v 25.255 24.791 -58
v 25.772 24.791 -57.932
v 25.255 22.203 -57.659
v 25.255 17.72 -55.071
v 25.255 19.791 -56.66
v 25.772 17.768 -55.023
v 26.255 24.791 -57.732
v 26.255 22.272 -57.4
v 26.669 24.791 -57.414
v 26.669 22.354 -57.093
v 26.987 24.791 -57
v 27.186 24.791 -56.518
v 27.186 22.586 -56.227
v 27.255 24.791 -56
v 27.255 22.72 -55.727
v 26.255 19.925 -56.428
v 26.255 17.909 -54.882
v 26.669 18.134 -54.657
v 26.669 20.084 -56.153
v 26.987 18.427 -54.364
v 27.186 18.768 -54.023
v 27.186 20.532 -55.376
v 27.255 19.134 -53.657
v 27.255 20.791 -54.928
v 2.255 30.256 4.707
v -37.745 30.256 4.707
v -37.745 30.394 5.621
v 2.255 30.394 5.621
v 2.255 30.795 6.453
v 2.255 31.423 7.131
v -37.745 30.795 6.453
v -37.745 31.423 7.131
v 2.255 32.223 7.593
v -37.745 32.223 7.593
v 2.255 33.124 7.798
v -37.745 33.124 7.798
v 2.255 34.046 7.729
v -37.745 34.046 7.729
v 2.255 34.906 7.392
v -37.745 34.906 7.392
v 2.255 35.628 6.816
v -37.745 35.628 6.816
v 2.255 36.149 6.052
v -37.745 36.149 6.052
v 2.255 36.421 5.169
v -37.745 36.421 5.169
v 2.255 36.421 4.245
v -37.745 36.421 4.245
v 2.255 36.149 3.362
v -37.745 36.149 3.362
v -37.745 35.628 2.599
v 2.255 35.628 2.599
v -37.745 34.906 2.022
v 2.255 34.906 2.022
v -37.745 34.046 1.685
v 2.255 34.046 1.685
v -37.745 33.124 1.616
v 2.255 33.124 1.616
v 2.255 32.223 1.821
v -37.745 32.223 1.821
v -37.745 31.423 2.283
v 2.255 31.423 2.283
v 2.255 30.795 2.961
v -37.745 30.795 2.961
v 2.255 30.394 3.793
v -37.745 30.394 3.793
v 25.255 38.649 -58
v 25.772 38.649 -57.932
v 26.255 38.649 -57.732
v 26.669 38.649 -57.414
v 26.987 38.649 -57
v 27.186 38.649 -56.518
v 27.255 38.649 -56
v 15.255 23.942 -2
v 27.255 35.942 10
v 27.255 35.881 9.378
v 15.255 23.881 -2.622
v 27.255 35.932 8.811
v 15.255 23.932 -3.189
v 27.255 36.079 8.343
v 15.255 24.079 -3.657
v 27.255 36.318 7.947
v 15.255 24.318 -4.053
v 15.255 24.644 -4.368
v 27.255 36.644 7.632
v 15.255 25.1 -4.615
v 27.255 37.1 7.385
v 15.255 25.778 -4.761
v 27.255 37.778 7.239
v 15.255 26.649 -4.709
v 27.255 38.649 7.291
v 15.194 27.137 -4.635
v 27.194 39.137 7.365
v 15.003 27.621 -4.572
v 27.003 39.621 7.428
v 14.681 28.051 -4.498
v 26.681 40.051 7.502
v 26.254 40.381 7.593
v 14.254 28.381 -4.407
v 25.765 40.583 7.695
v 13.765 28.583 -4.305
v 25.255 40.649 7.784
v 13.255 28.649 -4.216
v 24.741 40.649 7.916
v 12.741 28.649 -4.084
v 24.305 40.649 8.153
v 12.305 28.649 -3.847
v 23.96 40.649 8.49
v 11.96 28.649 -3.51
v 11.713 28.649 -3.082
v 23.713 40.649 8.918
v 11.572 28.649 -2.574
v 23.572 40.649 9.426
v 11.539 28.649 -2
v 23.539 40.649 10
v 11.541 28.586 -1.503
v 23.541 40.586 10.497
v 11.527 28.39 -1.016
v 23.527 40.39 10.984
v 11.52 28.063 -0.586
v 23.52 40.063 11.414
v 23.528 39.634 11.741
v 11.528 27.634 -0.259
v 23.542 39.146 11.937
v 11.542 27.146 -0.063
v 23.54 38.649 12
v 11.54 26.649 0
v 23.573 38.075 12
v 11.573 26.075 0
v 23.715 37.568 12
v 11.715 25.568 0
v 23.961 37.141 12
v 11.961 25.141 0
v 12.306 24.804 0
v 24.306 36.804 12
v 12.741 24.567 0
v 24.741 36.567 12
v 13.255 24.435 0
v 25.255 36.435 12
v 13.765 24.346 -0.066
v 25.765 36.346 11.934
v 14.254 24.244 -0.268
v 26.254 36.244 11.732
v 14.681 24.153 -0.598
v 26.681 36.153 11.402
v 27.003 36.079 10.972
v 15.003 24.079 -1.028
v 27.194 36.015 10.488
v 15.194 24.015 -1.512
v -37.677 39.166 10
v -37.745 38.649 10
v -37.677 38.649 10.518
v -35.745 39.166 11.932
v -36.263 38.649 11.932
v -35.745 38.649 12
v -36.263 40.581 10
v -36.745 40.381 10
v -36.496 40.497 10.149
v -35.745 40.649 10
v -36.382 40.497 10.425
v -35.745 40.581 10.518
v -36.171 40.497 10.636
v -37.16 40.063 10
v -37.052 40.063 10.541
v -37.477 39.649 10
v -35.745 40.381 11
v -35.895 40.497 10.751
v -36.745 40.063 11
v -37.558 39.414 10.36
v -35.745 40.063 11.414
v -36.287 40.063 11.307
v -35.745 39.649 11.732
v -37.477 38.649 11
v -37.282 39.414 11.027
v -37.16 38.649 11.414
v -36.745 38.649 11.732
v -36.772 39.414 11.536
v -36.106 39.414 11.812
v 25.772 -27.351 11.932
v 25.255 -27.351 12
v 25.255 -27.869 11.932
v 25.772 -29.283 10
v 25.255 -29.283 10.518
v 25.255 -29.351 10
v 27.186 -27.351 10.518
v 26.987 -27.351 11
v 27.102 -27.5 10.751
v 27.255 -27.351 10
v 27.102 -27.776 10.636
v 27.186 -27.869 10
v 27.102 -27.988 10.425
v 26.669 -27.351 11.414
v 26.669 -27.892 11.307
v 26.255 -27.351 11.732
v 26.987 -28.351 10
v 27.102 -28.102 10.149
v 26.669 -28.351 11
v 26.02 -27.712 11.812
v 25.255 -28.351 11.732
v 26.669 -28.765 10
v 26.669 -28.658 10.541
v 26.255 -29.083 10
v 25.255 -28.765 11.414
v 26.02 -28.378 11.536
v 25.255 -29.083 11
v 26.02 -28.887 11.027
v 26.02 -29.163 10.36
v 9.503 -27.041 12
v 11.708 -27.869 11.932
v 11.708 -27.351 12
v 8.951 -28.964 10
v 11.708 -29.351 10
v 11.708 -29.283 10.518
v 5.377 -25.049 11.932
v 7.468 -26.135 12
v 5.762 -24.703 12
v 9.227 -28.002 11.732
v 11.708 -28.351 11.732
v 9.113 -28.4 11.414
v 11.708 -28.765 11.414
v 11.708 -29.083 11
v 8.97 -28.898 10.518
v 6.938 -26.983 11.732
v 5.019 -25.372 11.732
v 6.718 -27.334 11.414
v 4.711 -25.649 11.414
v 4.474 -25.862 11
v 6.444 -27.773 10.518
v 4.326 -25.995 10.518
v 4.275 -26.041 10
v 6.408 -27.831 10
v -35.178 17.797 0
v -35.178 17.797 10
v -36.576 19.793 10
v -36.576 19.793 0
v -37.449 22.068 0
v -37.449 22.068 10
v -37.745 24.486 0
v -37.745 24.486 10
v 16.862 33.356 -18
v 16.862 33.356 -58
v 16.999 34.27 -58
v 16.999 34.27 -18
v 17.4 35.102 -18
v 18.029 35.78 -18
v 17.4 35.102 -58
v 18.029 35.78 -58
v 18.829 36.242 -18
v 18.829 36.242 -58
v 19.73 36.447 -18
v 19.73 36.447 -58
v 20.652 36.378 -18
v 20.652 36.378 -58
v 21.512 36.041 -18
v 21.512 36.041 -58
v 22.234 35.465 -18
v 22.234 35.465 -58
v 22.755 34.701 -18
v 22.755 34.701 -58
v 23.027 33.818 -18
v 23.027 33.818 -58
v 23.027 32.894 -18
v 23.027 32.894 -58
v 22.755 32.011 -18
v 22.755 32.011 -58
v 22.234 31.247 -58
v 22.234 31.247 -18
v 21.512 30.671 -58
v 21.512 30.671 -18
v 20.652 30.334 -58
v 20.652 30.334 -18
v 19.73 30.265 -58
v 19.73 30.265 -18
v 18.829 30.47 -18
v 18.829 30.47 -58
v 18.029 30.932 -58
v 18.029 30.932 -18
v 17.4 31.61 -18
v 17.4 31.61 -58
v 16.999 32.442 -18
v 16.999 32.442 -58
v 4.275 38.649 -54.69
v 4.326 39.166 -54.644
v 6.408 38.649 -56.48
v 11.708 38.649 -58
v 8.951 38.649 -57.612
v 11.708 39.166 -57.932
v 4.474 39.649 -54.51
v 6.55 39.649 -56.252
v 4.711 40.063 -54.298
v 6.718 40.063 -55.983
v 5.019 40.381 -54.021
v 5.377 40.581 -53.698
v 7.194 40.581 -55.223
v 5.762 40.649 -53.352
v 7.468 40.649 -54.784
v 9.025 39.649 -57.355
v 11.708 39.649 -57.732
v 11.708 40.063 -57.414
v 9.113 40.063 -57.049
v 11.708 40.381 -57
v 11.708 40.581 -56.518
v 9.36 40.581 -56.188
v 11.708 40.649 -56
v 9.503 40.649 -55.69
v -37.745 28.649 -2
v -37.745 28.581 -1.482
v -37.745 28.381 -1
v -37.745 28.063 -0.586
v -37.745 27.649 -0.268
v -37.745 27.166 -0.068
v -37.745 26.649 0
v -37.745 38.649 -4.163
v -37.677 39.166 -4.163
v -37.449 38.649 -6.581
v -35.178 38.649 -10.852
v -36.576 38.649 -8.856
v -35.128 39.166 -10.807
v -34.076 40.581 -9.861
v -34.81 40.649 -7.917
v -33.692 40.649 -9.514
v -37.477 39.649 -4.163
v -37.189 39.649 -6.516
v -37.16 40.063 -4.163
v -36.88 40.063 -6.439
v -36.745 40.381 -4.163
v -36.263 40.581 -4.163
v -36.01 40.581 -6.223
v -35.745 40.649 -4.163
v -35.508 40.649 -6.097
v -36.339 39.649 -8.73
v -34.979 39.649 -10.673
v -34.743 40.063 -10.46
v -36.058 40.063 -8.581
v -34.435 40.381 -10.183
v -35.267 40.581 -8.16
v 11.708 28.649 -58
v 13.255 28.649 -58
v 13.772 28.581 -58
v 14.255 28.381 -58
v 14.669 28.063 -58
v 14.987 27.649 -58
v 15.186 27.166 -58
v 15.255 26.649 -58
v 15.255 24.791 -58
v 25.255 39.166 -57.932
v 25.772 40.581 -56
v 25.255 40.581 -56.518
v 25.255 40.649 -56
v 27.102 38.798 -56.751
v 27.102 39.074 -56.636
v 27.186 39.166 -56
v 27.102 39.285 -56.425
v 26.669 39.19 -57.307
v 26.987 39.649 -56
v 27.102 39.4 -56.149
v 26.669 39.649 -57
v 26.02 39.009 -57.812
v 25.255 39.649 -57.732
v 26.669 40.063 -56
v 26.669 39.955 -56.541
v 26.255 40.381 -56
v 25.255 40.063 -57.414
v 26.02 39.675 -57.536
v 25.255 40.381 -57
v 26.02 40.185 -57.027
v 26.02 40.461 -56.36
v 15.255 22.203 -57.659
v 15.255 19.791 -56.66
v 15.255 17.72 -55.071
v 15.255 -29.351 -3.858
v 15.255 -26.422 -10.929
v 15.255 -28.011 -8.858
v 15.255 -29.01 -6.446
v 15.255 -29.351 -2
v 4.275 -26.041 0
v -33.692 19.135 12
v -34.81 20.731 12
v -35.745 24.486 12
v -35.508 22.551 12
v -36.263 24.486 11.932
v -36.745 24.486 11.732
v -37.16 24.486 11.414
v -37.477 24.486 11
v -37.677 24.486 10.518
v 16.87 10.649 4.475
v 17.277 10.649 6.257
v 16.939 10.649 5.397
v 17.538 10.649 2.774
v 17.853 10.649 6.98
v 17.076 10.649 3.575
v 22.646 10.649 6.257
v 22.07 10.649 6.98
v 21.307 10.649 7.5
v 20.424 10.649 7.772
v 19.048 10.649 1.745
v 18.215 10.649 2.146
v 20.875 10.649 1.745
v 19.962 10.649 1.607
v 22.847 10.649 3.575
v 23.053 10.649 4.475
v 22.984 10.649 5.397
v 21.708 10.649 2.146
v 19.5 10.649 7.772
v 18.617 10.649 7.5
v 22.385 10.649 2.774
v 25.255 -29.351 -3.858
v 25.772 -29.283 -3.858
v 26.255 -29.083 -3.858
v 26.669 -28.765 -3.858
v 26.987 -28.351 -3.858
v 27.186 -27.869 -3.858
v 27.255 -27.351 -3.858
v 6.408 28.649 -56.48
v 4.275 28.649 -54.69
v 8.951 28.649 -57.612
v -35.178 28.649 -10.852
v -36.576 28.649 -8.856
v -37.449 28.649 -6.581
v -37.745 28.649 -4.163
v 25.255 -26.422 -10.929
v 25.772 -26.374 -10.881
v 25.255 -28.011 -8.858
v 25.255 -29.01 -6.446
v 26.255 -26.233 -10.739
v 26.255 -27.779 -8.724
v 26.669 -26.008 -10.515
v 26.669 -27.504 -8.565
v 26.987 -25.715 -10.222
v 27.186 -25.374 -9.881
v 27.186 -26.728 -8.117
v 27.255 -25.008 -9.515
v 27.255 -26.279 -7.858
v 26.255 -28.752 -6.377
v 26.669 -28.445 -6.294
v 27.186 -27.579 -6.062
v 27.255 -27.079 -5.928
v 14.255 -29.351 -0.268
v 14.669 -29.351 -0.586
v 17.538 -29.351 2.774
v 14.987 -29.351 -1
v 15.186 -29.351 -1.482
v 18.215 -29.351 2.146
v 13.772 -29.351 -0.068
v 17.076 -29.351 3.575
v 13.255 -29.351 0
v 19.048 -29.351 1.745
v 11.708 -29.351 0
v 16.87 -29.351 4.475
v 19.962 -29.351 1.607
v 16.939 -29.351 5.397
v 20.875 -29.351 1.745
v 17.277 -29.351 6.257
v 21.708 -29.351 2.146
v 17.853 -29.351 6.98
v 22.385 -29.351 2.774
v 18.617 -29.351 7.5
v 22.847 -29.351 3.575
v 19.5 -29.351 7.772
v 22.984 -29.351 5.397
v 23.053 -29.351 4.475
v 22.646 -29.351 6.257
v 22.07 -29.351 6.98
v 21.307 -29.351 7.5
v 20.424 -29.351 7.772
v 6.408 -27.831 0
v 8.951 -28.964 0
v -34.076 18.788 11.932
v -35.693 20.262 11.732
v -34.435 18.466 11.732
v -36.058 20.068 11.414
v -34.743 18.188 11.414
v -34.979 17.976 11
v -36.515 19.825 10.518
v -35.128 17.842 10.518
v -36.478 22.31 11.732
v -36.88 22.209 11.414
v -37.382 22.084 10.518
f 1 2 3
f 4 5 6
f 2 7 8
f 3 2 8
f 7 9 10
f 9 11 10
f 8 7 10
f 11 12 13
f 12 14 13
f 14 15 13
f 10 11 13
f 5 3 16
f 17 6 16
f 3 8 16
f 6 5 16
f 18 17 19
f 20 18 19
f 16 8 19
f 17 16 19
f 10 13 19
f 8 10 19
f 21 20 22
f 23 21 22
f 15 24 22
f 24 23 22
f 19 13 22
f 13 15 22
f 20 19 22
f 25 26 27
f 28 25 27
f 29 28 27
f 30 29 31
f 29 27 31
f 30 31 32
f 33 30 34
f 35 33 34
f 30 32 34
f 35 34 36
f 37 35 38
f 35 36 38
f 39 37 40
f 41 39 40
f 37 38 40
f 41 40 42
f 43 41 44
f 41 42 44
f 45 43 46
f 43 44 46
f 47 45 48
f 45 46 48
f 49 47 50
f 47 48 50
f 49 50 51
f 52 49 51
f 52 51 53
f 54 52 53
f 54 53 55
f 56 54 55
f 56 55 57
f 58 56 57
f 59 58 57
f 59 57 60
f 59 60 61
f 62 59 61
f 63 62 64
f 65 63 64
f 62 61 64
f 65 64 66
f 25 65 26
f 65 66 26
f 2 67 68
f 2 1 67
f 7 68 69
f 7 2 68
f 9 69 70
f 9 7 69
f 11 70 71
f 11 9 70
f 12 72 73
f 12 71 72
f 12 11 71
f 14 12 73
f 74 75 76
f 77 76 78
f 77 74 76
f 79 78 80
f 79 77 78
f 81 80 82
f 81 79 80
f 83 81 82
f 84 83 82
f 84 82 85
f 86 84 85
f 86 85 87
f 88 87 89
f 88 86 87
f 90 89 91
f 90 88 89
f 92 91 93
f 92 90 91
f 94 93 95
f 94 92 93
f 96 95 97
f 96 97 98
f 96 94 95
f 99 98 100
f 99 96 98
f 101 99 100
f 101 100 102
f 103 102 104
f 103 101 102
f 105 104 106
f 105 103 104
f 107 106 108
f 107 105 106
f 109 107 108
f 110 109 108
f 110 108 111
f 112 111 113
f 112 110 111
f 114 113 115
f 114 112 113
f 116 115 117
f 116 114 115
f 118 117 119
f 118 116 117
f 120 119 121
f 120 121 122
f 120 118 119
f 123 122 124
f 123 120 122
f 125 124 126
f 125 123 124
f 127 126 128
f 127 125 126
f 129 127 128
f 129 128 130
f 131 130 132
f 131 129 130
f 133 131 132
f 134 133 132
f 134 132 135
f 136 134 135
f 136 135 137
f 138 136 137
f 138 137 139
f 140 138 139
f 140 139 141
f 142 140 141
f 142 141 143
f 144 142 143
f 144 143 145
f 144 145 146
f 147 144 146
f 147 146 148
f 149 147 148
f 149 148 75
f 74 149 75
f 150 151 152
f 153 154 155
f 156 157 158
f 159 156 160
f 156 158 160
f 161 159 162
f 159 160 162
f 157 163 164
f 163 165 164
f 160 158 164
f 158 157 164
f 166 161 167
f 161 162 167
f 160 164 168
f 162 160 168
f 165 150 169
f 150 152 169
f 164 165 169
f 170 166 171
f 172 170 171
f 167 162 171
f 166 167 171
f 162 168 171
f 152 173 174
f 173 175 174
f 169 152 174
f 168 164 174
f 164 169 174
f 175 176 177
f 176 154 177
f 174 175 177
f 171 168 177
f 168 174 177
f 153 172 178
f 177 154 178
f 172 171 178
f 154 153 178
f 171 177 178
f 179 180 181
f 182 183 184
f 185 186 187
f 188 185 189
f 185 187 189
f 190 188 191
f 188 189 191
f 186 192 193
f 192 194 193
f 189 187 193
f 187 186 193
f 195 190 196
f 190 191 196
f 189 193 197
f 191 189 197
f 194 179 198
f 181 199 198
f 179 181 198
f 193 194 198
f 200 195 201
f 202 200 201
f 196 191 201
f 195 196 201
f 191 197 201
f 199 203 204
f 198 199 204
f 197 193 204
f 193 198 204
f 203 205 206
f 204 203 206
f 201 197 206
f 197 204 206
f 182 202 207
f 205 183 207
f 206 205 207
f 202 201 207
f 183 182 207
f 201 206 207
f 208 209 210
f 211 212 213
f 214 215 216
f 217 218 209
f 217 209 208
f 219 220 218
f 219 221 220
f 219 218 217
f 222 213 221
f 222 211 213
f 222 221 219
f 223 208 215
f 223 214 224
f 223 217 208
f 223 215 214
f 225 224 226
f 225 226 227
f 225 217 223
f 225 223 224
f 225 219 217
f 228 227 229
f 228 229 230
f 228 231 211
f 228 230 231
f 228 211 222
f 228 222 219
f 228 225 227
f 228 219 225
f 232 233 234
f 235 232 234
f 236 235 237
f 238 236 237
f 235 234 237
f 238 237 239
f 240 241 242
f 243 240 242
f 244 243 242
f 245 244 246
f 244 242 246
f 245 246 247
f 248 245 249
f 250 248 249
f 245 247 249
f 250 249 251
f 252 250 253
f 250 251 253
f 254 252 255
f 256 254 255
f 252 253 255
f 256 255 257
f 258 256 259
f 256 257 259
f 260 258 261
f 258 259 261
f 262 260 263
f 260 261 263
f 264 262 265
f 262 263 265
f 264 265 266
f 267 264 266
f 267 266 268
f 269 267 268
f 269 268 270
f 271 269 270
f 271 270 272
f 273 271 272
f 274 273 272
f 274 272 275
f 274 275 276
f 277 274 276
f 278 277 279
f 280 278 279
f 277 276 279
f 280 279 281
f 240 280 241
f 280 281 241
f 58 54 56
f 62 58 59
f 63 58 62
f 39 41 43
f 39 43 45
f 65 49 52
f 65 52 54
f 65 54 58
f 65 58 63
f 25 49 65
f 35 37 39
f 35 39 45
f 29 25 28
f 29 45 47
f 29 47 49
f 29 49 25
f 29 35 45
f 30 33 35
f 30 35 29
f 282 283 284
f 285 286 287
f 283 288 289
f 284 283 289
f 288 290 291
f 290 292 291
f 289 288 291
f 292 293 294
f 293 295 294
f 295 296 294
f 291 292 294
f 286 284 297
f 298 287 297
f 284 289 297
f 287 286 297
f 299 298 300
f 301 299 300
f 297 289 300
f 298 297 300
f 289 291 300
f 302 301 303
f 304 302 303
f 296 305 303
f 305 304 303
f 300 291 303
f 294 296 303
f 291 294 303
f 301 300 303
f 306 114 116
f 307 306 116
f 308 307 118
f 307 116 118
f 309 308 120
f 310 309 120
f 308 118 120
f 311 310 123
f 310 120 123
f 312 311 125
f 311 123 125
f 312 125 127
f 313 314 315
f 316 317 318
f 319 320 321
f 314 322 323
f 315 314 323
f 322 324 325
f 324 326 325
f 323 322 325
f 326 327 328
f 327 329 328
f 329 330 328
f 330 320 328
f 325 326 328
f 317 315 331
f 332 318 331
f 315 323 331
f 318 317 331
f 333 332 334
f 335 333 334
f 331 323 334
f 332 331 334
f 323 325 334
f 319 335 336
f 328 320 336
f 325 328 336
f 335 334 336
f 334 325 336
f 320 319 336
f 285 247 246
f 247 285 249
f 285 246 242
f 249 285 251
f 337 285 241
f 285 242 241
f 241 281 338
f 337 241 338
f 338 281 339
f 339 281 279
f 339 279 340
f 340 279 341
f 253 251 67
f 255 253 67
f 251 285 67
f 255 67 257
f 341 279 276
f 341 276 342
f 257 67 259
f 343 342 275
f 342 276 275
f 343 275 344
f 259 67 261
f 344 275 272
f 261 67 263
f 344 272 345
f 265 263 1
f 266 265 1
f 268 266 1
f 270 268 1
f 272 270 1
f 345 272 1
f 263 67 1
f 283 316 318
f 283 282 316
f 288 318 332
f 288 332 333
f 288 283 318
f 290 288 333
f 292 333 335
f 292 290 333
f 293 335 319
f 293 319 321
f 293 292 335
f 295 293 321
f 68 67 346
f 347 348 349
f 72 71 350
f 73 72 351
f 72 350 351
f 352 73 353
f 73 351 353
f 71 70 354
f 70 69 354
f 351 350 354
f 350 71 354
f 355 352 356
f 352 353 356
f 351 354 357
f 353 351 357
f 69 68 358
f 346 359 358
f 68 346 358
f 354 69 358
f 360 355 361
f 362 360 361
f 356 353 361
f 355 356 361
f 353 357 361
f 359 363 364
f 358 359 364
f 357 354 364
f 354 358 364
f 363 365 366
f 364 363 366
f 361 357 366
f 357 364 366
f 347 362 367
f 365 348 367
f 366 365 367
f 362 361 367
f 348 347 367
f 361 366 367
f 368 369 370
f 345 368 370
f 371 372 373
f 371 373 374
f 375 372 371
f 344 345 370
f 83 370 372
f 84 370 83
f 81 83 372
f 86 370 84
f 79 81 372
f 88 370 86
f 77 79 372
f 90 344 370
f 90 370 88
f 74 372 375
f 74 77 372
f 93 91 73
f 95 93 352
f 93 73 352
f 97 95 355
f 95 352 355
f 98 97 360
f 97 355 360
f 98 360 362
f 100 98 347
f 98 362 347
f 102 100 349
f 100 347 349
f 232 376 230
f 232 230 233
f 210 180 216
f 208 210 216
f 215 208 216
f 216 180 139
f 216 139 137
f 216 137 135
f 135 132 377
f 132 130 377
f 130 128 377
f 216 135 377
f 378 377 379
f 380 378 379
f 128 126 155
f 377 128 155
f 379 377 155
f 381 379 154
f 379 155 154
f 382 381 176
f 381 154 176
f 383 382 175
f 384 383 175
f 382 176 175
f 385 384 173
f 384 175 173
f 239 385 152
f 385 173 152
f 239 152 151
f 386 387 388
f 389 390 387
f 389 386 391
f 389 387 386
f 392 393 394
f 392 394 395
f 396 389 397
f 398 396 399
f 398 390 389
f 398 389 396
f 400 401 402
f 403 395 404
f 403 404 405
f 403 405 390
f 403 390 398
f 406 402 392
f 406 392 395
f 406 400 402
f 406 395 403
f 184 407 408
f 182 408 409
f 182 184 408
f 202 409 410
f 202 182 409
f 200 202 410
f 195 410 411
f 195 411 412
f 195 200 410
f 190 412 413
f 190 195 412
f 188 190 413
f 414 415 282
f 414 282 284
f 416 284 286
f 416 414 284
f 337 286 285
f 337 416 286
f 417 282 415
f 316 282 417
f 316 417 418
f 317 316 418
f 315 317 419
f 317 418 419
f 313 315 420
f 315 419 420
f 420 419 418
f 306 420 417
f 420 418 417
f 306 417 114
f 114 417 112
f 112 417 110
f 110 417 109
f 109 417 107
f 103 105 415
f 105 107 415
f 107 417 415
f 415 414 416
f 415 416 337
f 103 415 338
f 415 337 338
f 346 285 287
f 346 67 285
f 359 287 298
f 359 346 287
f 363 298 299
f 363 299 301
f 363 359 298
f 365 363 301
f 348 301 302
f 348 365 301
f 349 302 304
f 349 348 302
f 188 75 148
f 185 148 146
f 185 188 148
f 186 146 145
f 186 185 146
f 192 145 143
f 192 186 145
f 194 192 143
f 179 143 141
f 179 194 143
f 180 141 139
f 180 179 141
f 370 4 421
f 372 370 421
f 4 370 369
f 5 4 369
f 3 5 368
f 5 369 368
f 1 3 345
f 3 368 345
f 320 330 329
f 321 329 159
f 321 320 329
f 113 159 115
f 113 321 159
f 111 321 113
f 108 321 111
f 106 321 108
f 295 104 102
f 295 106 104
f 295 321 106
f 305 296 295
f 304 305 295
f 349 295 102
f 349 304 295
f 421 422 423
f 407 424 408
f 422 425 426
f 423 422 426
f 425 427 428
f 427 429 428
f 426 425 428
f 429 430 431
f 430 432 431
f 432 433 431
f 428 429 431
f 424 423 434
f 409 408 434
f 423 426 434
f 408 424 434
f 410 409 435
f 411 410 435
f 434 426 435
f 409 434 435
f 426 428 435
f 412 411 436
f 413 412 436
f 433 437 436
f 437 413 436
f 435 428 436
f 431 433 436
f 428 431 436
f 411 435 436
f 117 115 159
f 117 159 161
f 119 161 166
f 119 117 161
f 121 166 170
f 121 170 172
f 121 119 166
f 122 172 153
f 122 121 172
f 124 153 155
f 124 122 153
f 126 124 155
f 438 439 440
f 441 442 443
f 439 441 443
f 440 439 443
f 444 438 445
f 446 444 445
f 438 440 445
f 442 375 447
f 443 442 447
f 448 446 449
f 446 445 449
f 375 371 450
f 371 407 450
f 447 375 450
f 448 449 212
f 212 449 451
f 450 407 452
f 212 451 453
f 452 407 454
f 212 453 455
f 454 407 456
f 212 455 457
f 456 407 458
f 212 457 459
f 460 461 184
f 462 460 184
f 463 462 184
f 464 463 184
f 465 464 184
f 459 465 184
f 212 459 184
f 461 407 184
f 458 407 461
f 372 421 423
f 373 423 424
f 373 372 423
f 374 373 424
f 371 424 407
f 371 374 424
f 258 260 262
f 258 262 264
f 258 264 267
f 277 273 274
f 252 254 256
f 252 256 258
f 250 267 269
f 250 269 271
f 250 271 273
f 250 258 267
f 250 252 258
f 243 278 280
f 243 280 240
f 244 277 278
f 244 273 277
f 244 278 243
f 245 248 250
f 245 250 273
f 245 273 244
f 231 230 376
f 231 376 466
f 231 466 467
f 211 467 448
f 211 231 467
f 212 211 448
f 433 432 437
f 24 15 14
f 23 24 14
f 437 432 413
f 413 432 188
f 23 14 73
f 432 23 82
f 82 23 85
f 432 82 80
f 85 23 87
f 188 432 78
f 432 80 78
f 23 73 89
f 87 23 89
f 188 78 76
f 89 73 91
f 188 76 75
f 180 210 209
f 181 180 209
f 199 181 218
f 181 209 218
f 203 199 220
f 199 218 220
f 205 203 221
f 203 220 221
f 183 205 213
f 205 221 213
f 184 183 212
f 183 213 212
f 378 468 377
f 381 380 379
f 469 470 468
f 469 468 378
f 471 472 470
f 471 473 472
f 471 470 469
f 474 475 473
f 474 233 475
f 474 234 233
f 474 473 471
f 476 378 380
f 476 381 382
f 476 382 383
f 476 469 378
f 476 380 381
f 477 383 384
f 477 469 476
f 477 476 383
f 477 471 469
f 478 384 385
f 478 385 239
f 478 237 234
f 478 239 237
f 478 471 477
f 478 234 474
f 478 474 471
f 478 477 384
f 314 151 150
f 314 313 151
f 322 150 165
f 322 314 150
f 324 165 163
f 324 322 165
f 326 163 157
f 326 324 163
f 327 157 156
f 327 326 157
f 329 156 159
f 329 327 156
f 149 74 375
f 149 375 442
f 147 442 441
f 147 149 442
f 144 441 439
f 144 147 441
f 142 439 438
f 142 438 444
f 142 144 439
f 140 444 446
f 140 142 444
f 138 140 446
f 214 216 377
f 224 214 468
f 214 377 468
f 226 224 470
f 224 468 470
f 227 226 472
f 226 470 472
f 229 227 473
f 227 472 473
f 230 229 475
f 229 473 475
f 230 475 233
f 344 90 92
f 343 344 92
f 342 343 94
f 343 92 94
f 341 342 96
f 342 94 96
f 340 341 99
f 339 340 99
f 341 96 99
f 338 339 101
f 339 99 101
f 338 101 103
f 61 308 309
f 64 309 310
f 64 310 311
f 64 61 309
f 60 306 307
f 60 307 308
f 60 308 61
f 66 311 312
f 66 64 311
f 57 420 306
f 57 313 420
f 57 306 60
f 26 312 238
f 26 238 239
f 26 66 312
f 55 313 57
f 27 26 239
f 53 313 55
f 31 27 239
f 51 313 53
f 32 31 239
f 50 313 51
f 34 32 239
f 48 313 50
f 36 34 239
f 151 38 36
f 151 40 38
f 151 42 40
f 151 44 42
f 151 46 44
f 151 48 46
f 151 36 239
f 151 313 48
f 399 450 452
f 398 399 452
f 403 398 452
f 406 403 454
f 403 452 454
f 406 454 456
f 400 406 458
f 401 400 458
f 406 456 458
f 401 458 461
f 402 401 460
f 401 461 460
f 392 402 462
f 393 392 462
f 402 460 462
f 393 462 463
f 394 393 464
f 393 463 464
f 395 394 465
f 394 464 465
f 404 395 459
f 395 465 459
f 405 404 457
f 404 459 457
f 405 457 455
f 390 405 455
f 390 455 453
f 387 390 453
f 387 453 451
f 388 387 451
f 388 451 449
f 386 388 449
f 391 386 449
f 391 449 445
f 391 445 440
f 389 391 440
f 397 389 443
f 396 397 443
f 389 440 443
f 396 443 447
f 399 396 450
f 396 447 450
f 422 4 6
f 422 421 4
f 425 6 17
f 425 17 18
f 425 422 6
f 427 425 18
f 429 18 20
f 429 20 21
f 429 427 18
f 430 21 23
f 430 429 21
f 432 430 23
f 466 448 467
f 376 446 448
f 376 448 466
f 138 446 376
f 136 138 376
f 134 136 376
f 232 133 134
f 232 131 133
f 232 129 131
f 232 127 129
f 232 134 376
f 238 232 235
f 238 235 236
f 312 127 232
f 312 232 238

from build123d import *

# Parameters (mm, degrees)
RESSALTO_EXTRUS_O1_DEPTH   = 12
RESSALTO_EXTRUS_O2_DEPTH   = 12
RESSALTO_EXTRUS_O3_DEPTH   = 12
FILETE1_R                  = 10
FILETE2_R                  = 2
FILETE3_R                  = 2
ESBO_O11_R                 = 3.1
CORTE_EXTRUS_O4_DEPTH      = 40
ESBO_O12_R                 = 3.1
CORTE_EXTRUS_O5_DEPTH      = 40
ESBO_O10_R                 = 3.1
CORTE_EXTRUS_O6_DEPTH      = 40
CORTE_EXTRUS_O8_DEPTH      = 10
CORTE_EXTRUS_O8_DEPTH_BACK = 30
ESBO_O15_R                 = 3


with BuildPart() as part:
    # Esboço1 → Ressalto-extrusão1 (new body)
    with BuildSketch(Plane.XY):
        Polygon((7.254630019, -29.35114002), (-37.745369981, 20.64885998), (-37.745369981, 40.64885998), (27.254630019, 40.64885998), (27.254630019, -29.35114002), align=None)
    extrude(amount=RESSALTO_EXTRUS_O1_DEPTH)

    # Esboço2 → Ressalto-extrusão2 (add)
    with BuildSketch(Plane(origin=(0, 40.64885998, 0), x_dir=(1, 0, 0), z_dir=(0, 1, 0))):
        Polygon((7.254630019, 58), (-37.745369981, 8), (-37.745369981, -12), (27.254630019, -12), (27.254630019, 58), align=None)
    extrude(amount=-RESSALTO_EXTRUS_O2_DEPTH)

    # Esboço3 → Ressalto-extrusão3 (add)
    with BuildSketch(Plane(origin=(27.254630019, 0, 0), x_dir=(0, 0, -1), z_dir=(1, 0, 0))):
        Polygon((58, 20.64885998), (8, -29.35114002), (-12, -29.35114002), (-12, 40.64885998), (58, 40.64885998), align=None)
    extrude(amount=-RESSALTO_EXTRUS_O3_DEPTH)

    # Filete1
    filete1_edges = [part.edges().sort_by_distance(p)[0] for p in [
        (-37.745369981, 34.64885998, -8),
        (7.254630019, 34.64885998, -58),
        (21.254630019, -29.35114002, -8),
        (21.254630019, 20.64885998, -58),
        (7.254630019, -29.35114002, 6),
        (-37.745369981, 20.64885998, 6),
    ]]
    fillet(filete1_edges, radius=FILETE1_R)

    # Filete2
    filete2_edges = [part.edges().sort_by_distance(p)[0] for p in [
        (-37.745369981, 32.567540006, 12),
        (19.481442042, 40.64885998, -58),
        (27.254630019, 5.64885998, 12),
        (-15.45149942, 40.64885998, -32.77096729),
        (7.639868216, 40.64885998, -57.135000634),
        (-37.081574098, 40.64885998, -7.74527762),
        (-15.45149942, -4.12210731, 12),
        (19.481442042, -29.35114002, 12),
        (7.639868216, -28.486140654, 12),
        (-37.081574098, 20.90358236, 12),
        (27.254630019, -4.35114002, -33),
        (27.254630019, 32.719927792, -58),
        (27.254630019, 20.96416128, -57.238795325),
        (27.254630019, -28.589935345, -7.6846987),
        (-5.245369981, 40.64885998, 12),
        (27.254630019, -29.35114002, 4.071067812),
        (-37.745369981, 40.64885998, 3.918680026),
        (27.254630019, 40.64885998, -23),
    ]]
    fillet(filete2_edges, radius=FILETE2_R)

    # Filete3
    filete3_edges = [part.edges().sort_by_distance(p)[0] for p in [
        (-11.245369981, 28.64885998, 0),
        (15.254630019, -0.35114002, 0),
        (15.254630019, 28.64885998, -29),
    ]]
    fillet(filete3_edges, radius=FILETE3_R)

    # Esboço11 → Corte-extrusão4 (cut)
    with BuildSketch(Plane.ZY.offset(37.745369981)):
        with Locations(Location((4.707106781, 33.355966761, 0), (0, 0, 270))):
            Circle(ESBO_O11_R)
    extrude(amount=-CORTE_EXTRUS_O4_DEPTH, mode=Mode.SUBTRACT)

    # Esboço12 → Corte-extrusão5 (cut)
    with BuildSketch(Plane.XZ.offset(29.35114002)):
        with Locations(Location((19.9617368, 4.707106781, 0), (0, 0, 270))):
            Circle(ESBO_O12_R)
    extrude(amount=-CORTE_EXTRUS_O5_DEPTH, mode=Mode.SUBTRACT)

    # Esboço10 → Corte-extrusão6 (cut)
    with BuildSketch(Plane(origin=(0, 0, -58), x_dir=(-1, 0, 0), z_dir=(0, 0, -1))):
        with Locations((-19.9617368, 33.355966761)):
            Circle(ESBO_O10_R)
    extrude(amount=-CORTE_EXTRUS_O6_DEPTH, mode=Mode.SUBTRACT)

    # Esboço15 → Corte-extrusão8 (cut, two sides: drawn at the far end of the back side and taken through both)
    with BuildSketch(Plane(origin=(25.301163333, 25.301163333, 25.301163333), x_dir=(0.8164965809277263, -0.40824829046386346, -0.40824829046386246), z_dir=(0.5773502691896256, 0.5773502691896265, 0.5773502691896252)).offset(-CORTE_EXTRUS_O8_DEPTH_BACK)):
        with Locations(Location((1.188623136, 20.258589603, 0), (0, 0, 320.328232449))):
            Circle(ESBO_O15_R)
    extrude(amount=CORTE_EXTRUS_O8_DEPTH + CORTE_EXTRUS_O8_DEPTH_BACK, mode=Mode.SUBTRACT)


solid = part.part
